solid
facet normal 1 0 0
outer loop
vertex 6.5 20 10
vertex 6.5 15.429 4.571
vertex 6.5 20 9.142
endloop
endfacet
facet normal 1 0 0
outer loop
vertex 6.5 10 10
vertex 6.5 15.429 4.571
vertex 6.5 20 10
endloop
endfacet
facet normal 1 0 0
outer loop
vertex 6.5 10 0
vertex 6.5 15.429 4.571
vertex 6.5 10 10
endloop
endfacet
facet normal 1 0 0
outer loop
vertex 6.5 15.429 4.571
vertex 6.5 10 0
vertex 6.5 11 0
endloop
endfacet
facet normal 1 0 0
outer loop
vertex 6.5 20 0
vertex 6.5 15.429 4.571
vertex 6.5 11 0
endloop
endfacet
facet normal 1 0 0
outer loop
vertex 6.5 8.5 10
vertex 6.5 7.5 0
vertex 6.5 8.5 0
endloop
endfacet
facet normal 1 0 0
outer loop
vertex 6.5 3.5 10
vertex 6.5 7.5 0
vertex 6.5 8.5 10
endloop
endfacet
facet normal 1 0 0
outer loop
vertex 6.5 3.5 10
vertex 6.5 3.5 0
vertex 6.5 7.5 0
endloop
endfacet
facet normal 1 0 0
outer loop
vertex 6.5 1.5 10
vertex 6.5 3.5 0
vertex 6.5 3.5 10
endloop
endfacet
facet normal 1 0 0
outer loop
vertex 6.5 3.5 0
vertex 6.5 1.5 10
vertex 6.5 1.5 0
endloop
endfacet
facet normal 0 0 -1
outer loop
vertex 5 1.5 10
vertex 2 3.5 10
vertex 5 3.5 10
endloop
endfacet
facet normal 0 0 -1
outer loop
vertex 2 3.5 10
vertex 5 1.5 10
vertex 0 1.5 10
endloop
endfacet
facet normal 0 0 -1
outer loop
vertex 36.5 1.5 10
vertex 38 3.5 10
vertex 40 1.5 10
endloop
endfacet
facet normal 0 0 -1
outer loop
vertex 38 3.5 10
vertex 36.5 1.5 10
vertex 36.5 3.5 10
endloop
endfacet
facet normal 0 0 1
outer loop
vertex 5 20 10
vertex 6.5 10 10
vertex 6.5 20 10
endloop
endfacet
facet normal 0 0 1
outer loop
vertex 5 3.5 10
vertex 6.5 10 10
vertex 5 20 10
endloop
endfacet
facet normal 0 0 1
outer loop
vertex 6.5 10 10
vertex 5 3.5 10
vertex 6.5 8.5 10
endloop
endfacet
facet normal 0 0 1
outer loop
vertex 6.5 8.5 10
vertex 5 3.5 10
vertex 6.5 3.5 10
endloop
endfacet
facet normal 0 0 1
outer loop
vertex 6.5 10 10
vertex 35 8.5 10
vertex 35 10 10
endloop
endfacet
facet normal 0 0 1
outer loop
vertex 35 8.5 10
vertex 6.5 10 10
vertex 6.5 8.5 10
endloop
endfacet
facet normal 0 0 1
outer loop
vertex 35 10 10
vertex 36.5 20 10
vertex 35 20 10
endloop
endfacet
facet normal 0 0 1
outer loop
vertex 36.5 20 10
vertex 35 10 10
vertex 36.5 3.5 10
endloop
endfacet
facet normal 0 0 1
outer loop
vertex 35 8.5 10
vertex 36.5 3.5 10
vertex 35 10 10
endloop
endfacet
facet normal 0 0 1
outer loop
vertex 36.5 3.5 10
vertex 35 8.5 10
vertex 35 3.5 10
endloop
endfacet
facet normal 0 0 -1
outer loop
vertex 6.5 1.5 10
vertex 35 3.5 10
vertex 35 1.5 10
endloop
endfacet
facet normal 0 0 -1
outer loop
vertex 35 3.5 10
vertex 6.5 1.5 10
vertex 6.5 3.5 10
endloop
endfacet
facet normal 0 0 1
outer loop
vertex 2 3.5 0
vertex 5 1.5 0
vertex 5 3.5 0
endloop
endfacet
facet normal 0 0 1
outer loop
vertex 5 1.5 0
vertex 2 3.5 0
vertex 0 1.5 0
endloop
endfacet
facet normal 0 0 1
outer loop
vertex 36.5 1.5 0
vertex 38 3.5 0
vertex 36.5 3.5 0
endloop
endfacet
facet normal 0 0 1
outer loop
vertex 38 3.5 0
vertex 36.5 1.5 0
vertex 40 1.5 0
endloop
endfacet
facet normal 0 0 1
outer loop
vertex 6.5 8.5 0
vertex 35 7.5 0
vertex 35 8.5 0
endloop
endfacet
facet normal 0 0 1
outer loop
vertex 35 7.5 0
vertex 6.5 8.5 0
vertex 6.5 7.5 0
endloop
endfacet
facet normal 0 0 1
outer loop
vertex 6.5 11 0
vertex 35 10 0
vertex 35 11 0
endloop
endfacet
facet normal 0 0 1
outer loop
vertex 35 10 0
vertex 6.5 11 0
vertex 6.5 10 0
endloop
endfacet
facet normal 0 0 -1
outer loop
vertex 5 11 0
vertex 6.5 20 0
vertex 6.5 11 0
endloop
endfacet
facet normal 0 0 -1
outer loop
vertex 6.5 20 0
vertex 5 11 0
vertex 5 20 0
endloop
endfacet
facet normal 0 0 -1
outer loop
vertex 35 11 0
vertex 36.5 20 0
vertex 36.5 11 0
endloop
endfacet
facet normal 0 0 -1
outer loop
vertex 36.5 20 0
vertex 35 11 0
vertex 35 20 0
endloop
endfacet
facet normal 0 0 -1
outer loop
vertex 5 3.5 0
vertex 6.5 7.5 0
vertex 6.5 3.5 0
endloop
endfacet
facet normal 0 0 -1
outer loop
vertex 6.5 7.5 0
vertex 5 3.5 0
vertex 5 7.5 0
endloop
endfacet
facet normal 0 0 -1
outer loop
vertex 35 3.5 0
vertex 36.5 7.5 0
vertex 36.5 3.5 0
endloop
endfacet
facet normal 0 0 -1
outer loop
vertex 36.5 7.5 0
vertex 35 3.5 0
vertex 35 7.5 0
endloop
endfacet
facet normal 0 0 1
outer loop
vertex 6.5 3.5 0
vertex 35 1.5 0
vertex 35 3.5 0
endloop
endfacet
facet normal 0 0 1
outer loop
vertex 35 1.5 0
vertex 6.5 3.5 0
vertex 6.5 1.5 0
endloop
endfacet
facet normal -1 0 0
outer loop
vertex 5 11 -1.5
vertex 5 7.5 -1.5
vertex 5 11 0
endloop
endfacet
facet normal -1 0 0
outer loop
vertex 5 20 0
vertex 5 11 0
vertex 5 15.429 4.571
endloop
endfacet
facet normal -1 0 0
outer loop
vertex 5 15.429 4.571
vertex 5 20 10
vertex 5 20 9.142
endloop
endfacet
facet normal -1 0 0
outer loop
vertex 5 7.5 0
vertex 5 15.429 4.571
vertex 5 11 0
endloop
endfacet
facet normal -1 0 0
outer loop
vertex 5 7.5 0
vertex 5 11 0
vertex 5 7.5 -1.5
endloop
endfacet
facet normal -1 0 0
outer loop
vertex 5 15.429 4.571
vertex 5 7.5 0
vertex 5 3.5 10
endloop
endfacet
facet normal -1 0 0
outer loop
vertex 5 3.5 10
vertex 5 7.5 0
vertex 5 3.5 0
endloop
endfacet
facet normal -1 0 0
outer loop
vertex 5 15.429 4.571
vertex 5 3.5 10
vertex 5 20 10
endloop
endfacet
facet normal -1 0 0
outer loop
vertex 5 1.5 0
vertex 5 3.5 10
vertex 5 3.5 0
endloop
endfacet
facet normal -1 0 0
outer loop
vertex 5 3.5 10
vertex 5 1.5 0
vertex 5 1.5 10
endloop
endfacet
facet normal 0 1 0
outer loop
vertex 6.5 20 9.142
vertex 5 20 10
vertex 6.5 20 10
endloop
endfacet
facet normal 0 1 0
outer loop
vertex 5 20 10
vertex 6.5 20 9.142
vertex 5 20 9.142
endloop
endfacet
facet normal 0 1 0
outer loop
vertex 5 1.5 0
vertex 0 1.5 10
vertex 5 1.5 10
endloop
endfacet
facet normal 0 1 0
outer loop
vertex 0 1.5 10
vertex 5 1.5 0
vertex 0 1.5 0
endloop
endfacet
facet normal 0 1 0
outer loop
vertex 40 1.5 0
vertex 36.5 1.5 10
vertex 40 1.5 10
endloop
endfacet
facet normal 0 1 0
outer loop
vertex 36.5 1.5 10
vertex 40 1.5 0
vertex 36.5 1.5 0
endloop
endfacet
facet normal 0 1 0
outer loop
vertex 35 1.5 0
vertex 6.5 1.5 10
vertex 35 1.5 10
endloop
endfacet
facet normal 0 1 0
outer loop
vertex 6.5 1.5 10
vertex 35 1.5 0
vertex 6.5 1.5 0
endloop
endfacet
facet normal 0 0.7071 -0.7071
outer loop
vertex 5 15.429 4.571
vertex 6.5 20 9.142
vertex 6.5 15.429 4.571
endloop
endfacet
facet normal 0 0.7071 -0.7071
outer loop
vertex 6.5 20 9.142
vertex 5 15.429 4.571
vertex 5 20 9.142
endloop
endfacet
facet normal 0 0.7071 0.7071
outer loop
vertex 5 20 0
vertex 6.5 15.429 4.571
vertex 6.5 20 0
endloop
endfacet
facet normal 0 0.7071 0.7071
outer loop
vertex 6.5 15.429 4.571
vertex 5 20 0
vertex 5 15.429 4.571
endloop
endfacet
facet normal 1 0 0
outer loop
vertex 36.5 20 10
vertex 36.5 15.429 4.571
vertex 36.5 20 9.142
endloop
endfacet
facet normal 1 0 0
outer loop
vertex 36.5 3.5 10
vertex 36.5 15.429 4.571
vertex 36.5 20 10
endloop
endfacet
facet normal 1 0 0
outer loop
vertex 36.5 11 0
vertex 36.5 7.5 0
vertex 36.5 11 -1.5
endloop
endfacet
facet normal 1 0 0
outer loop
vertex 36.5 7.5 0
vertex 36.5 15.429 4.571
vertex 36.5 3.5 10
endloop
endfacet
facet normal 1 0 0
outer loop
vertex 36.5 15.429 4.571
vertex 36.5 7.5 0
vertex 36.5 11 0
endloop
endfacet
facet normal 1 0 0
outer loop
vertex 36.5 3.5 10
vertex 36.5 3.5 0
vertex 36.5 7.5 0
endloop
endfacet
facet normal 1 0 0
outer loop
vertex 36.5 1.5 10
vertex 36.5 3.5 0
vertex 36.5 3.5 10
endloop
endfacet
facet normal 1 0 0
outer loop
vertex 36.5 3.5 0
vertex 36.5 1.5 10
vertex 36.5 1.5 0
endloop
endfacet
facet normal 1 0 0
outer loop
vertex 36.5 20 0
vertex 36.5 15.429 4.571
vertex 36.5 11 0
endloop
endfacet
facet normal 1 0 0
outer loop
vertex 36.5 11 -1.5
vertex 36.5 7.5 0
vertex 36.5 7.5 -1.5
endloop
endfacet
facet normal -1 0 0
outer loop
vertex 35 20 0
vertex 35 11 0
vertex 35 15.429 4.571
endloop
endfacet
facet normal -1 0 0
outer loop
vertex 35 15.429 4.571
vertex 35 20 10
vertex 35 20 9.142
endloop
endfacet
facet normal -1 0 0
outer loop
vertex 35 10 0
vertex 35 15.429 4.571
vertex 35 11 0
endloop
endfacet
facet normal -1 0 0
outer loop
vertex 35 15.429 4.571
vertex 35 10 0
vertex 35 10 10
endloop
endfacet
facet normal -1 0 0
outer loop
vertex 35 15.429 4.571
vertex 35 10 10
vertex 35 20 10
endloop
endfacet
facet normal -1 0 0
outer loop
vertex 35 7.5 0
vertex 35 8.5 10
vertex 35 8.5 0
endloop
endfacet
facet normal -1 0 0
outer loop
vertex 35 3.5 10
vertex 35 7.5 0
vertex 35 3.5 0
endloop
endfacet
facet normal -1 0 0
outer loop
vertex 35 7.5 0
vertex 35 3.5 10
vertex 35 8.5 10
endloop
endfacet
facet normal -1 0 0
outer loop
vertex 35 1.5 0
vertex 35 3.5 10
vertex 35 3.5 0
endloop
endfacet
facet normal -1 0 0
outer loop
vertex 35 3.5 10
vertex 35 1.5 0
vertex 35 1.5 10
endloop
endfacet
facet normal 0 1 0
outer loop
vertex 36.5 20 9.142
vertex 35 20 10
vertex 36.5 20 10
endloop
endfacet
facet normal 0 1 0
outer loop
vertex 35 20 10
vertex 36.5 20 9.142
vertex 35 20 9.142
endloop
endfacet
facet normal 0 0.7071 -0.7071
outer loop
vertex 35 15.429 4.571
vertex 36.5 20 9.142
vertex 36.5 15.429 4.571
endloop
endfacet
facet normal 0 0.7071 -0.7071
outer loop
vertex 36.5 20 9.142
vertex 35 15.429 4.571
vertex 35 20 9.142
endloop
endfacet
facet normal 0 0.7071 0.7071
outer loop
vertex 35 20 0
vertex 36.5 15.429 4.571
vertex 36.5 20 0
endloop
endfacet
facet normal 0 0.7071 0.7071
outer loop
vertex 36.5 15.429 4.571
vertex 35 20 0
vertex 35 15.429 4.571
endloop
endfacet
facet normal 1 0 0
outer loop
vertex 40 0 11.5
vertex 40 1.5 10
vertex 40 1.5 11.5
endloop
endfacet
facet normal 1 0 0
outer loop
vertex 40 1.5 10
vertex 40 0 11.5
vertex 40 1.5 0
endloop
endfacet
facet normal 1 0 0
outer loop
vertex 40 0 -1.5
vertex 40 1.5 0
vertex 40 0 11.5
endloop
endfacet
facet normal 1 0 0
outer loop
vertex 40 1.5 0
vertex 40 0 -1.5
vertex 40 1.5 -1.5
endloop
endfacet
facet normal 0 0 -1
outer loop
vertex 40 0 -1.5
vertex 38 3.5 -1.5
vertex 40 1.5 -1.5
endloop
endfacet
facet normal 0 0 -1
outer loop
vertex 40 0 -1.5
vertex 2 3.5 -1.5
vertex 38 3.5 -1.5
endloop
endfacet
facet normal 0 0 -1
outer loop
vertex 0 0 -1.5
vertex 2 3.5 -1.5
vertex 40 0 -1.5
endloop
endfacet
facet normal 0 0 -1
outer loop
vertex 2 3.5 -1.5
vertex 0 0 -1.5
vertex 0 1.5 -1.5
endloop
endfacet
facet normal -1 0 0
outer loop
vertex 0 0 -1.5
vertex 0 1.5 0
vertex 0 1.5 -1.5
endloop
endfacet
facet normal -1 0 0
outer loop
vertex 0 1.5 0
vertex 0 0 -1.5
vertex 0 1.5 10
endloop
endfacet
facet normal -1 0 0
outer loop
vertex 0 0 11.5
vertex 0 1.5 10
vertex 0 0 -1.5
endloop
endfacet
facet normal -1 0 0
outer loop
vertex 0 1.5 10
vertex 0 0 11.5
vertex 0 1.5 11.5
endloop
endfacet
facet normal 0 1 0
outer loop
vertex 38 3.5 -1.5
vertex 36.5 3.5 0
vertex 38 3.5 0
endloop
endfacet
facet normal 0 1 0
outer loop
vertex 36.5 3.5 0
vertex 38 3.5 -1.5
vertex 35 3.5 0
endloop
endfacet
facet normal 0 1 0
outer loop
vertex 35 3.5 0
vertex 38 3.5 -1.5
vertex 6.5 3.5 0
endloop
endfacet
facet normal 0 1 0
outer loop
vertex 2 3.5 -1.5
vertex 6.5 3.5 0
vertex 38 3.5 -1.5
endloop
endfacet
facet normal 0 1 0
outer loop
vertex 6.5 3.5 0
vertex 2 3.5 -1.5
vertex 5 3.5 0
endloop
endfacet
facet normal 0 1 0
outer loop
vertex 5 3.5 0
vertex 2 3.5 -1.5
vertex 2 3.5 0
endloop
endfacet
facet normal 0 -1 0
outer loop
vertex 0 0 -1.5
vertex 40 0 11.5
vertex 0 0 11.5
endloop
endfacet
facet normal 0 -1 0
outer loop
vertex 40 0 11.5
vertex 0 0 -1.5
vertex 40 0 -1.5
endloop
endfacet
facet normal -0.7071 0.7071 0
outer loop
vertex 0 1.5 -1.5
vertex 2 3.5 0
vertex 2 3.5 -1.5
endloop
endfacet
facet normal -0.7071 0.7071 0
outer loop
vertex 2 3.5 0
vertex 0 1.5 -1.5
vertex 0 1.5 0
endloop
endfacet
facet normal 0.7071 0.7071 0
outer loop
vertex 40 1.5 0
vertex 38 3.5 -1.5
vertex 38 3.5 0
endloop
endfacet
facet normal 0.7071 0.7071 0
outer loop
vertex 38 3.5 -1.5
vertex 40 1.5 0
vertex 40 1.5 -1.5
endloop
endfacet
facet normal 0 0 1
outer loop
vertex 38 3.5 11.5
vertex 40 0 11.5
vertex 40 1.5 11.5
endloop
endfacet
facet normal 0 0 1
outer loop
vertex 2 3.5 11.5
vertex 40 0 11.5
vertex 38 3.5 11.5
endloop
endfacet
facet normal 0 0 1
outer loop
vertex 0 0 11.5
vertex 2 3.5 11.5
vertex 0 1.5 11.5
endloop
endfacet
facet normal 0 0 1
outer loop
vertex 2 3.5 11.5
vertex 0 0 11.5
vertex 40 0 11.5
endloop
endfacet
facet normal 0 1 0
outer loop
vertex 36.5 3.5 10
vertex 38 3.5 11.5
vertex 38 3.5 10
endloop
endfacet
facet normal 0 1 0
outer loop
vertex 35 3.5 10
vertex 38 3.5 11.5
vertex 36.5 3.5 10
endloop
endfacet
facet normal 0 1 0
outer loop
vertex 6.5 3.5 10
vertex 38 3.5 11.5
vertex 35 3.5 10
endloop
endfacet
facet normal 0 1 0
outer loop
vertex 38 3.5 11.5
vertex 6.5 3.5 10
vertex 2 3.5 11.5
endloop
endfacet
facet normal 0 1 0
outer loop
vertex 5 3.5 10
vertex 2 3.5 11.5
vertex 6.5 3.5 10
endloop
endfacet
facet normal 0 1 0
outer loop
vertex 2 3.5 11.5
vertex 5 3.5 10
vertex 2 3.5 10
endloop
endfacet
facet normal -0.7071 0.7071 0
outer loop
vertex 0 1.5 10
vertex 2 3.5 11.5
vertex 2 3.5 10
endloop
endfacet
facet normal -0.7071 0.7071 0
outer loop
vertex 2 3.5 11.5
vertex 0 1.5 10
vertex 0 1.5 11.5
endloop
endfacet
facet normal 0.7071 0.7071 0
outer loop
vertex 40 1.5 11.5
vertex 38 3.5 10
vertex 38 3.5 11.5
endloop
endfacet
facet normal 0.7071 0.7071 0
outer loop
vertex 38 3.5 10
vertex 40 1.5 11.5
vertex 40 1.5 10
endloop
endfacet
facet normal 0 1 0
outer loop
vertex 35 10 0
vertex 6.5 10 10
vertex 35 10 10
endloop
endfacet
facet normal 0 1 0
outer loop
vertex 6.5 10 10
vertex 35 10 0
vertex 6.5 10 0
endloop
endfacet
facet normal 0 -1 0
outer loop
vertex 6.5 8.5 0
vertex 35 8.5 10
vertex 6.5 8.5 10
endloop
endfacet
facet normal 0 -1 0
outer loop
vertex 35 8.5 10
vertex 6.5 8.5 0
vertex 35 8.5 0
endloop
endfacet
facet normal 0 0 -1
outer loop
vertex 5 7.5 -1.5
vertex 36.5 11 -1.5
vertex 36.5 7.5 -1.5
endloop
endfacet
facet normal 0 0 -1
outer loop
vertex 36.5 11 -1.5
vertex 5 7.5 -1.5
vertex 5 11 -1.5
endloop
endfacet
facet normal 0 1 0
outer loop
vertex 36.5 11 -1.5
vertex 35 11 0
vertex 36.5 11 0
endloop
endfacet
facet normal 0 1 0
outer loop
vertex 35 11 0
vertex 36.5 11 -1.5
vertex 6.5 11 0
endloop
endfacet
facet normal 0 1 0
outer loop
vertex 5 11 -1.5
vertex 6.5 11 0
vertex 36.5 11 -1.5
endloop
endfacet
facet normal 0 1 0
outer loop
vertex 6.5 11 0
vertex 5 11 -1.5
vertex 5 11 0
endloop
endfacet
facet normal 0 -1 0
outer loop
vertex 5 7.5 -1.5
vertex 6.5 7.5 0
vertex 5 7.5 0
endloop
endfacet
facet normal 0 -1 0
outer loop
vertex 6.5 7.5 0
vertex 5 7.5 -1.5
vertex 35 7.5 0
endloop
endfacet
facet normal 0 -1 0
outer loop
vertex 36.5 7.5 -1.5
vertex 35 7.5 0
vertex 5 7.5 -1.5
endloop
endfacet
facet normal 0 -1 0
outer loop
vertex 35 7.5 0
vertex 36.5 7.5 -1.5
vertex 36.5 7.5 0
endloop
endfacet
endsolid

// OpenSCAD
// top
cube([40,1.5,10]);

// legs
translate([5,1.5,0]){
	difference(){
		cube([1.5, 18.5, 10]);
			translate([-1,21,-2.5]){
			rotate([45,0,0]){
				cube([3,10,10]);
			}
		}
	}
}

translate([35,1.5,0]){
	difference(){
		cube([1.5, 18.5, 10]);
			translate([-1,21,-2.5]){
			rotate([45,0,0]){
				cube([3,10,10]);
			}
		}
	}
}

// shelf
translate([6.5,8.5,0]){
	cube([30,1.5,10]);
}

// shelf brace
translate([5,7.5,-1.5]){
	cube([31.5,3.5,1.5]);
}

// leg braces
translate([0,0,-1.5]){
	difference(){
		cube([40,3.5,1.5]);
		translate([0,1.5,-.25]){
			rotate([0,0,45]){
				cube([3,3,2]);
			}
		}
		translate([40,1.5,-.25]){
			rotate([0,0,45]){
				cube([3,3,2]);
			}
		}
	}
}
translate([0,0,10]){
	difference(){
		cube([40,3.5,1.5]);
		translate([0,1.5,-.25]){
			rotate([0,0,45]){
				cube([3,3,2]);
			}
		}
		translate([40,1.5,-.25]){
			rotate([0,0,45]){
				cube([3,3,2]);
			}
		}
	}
}
